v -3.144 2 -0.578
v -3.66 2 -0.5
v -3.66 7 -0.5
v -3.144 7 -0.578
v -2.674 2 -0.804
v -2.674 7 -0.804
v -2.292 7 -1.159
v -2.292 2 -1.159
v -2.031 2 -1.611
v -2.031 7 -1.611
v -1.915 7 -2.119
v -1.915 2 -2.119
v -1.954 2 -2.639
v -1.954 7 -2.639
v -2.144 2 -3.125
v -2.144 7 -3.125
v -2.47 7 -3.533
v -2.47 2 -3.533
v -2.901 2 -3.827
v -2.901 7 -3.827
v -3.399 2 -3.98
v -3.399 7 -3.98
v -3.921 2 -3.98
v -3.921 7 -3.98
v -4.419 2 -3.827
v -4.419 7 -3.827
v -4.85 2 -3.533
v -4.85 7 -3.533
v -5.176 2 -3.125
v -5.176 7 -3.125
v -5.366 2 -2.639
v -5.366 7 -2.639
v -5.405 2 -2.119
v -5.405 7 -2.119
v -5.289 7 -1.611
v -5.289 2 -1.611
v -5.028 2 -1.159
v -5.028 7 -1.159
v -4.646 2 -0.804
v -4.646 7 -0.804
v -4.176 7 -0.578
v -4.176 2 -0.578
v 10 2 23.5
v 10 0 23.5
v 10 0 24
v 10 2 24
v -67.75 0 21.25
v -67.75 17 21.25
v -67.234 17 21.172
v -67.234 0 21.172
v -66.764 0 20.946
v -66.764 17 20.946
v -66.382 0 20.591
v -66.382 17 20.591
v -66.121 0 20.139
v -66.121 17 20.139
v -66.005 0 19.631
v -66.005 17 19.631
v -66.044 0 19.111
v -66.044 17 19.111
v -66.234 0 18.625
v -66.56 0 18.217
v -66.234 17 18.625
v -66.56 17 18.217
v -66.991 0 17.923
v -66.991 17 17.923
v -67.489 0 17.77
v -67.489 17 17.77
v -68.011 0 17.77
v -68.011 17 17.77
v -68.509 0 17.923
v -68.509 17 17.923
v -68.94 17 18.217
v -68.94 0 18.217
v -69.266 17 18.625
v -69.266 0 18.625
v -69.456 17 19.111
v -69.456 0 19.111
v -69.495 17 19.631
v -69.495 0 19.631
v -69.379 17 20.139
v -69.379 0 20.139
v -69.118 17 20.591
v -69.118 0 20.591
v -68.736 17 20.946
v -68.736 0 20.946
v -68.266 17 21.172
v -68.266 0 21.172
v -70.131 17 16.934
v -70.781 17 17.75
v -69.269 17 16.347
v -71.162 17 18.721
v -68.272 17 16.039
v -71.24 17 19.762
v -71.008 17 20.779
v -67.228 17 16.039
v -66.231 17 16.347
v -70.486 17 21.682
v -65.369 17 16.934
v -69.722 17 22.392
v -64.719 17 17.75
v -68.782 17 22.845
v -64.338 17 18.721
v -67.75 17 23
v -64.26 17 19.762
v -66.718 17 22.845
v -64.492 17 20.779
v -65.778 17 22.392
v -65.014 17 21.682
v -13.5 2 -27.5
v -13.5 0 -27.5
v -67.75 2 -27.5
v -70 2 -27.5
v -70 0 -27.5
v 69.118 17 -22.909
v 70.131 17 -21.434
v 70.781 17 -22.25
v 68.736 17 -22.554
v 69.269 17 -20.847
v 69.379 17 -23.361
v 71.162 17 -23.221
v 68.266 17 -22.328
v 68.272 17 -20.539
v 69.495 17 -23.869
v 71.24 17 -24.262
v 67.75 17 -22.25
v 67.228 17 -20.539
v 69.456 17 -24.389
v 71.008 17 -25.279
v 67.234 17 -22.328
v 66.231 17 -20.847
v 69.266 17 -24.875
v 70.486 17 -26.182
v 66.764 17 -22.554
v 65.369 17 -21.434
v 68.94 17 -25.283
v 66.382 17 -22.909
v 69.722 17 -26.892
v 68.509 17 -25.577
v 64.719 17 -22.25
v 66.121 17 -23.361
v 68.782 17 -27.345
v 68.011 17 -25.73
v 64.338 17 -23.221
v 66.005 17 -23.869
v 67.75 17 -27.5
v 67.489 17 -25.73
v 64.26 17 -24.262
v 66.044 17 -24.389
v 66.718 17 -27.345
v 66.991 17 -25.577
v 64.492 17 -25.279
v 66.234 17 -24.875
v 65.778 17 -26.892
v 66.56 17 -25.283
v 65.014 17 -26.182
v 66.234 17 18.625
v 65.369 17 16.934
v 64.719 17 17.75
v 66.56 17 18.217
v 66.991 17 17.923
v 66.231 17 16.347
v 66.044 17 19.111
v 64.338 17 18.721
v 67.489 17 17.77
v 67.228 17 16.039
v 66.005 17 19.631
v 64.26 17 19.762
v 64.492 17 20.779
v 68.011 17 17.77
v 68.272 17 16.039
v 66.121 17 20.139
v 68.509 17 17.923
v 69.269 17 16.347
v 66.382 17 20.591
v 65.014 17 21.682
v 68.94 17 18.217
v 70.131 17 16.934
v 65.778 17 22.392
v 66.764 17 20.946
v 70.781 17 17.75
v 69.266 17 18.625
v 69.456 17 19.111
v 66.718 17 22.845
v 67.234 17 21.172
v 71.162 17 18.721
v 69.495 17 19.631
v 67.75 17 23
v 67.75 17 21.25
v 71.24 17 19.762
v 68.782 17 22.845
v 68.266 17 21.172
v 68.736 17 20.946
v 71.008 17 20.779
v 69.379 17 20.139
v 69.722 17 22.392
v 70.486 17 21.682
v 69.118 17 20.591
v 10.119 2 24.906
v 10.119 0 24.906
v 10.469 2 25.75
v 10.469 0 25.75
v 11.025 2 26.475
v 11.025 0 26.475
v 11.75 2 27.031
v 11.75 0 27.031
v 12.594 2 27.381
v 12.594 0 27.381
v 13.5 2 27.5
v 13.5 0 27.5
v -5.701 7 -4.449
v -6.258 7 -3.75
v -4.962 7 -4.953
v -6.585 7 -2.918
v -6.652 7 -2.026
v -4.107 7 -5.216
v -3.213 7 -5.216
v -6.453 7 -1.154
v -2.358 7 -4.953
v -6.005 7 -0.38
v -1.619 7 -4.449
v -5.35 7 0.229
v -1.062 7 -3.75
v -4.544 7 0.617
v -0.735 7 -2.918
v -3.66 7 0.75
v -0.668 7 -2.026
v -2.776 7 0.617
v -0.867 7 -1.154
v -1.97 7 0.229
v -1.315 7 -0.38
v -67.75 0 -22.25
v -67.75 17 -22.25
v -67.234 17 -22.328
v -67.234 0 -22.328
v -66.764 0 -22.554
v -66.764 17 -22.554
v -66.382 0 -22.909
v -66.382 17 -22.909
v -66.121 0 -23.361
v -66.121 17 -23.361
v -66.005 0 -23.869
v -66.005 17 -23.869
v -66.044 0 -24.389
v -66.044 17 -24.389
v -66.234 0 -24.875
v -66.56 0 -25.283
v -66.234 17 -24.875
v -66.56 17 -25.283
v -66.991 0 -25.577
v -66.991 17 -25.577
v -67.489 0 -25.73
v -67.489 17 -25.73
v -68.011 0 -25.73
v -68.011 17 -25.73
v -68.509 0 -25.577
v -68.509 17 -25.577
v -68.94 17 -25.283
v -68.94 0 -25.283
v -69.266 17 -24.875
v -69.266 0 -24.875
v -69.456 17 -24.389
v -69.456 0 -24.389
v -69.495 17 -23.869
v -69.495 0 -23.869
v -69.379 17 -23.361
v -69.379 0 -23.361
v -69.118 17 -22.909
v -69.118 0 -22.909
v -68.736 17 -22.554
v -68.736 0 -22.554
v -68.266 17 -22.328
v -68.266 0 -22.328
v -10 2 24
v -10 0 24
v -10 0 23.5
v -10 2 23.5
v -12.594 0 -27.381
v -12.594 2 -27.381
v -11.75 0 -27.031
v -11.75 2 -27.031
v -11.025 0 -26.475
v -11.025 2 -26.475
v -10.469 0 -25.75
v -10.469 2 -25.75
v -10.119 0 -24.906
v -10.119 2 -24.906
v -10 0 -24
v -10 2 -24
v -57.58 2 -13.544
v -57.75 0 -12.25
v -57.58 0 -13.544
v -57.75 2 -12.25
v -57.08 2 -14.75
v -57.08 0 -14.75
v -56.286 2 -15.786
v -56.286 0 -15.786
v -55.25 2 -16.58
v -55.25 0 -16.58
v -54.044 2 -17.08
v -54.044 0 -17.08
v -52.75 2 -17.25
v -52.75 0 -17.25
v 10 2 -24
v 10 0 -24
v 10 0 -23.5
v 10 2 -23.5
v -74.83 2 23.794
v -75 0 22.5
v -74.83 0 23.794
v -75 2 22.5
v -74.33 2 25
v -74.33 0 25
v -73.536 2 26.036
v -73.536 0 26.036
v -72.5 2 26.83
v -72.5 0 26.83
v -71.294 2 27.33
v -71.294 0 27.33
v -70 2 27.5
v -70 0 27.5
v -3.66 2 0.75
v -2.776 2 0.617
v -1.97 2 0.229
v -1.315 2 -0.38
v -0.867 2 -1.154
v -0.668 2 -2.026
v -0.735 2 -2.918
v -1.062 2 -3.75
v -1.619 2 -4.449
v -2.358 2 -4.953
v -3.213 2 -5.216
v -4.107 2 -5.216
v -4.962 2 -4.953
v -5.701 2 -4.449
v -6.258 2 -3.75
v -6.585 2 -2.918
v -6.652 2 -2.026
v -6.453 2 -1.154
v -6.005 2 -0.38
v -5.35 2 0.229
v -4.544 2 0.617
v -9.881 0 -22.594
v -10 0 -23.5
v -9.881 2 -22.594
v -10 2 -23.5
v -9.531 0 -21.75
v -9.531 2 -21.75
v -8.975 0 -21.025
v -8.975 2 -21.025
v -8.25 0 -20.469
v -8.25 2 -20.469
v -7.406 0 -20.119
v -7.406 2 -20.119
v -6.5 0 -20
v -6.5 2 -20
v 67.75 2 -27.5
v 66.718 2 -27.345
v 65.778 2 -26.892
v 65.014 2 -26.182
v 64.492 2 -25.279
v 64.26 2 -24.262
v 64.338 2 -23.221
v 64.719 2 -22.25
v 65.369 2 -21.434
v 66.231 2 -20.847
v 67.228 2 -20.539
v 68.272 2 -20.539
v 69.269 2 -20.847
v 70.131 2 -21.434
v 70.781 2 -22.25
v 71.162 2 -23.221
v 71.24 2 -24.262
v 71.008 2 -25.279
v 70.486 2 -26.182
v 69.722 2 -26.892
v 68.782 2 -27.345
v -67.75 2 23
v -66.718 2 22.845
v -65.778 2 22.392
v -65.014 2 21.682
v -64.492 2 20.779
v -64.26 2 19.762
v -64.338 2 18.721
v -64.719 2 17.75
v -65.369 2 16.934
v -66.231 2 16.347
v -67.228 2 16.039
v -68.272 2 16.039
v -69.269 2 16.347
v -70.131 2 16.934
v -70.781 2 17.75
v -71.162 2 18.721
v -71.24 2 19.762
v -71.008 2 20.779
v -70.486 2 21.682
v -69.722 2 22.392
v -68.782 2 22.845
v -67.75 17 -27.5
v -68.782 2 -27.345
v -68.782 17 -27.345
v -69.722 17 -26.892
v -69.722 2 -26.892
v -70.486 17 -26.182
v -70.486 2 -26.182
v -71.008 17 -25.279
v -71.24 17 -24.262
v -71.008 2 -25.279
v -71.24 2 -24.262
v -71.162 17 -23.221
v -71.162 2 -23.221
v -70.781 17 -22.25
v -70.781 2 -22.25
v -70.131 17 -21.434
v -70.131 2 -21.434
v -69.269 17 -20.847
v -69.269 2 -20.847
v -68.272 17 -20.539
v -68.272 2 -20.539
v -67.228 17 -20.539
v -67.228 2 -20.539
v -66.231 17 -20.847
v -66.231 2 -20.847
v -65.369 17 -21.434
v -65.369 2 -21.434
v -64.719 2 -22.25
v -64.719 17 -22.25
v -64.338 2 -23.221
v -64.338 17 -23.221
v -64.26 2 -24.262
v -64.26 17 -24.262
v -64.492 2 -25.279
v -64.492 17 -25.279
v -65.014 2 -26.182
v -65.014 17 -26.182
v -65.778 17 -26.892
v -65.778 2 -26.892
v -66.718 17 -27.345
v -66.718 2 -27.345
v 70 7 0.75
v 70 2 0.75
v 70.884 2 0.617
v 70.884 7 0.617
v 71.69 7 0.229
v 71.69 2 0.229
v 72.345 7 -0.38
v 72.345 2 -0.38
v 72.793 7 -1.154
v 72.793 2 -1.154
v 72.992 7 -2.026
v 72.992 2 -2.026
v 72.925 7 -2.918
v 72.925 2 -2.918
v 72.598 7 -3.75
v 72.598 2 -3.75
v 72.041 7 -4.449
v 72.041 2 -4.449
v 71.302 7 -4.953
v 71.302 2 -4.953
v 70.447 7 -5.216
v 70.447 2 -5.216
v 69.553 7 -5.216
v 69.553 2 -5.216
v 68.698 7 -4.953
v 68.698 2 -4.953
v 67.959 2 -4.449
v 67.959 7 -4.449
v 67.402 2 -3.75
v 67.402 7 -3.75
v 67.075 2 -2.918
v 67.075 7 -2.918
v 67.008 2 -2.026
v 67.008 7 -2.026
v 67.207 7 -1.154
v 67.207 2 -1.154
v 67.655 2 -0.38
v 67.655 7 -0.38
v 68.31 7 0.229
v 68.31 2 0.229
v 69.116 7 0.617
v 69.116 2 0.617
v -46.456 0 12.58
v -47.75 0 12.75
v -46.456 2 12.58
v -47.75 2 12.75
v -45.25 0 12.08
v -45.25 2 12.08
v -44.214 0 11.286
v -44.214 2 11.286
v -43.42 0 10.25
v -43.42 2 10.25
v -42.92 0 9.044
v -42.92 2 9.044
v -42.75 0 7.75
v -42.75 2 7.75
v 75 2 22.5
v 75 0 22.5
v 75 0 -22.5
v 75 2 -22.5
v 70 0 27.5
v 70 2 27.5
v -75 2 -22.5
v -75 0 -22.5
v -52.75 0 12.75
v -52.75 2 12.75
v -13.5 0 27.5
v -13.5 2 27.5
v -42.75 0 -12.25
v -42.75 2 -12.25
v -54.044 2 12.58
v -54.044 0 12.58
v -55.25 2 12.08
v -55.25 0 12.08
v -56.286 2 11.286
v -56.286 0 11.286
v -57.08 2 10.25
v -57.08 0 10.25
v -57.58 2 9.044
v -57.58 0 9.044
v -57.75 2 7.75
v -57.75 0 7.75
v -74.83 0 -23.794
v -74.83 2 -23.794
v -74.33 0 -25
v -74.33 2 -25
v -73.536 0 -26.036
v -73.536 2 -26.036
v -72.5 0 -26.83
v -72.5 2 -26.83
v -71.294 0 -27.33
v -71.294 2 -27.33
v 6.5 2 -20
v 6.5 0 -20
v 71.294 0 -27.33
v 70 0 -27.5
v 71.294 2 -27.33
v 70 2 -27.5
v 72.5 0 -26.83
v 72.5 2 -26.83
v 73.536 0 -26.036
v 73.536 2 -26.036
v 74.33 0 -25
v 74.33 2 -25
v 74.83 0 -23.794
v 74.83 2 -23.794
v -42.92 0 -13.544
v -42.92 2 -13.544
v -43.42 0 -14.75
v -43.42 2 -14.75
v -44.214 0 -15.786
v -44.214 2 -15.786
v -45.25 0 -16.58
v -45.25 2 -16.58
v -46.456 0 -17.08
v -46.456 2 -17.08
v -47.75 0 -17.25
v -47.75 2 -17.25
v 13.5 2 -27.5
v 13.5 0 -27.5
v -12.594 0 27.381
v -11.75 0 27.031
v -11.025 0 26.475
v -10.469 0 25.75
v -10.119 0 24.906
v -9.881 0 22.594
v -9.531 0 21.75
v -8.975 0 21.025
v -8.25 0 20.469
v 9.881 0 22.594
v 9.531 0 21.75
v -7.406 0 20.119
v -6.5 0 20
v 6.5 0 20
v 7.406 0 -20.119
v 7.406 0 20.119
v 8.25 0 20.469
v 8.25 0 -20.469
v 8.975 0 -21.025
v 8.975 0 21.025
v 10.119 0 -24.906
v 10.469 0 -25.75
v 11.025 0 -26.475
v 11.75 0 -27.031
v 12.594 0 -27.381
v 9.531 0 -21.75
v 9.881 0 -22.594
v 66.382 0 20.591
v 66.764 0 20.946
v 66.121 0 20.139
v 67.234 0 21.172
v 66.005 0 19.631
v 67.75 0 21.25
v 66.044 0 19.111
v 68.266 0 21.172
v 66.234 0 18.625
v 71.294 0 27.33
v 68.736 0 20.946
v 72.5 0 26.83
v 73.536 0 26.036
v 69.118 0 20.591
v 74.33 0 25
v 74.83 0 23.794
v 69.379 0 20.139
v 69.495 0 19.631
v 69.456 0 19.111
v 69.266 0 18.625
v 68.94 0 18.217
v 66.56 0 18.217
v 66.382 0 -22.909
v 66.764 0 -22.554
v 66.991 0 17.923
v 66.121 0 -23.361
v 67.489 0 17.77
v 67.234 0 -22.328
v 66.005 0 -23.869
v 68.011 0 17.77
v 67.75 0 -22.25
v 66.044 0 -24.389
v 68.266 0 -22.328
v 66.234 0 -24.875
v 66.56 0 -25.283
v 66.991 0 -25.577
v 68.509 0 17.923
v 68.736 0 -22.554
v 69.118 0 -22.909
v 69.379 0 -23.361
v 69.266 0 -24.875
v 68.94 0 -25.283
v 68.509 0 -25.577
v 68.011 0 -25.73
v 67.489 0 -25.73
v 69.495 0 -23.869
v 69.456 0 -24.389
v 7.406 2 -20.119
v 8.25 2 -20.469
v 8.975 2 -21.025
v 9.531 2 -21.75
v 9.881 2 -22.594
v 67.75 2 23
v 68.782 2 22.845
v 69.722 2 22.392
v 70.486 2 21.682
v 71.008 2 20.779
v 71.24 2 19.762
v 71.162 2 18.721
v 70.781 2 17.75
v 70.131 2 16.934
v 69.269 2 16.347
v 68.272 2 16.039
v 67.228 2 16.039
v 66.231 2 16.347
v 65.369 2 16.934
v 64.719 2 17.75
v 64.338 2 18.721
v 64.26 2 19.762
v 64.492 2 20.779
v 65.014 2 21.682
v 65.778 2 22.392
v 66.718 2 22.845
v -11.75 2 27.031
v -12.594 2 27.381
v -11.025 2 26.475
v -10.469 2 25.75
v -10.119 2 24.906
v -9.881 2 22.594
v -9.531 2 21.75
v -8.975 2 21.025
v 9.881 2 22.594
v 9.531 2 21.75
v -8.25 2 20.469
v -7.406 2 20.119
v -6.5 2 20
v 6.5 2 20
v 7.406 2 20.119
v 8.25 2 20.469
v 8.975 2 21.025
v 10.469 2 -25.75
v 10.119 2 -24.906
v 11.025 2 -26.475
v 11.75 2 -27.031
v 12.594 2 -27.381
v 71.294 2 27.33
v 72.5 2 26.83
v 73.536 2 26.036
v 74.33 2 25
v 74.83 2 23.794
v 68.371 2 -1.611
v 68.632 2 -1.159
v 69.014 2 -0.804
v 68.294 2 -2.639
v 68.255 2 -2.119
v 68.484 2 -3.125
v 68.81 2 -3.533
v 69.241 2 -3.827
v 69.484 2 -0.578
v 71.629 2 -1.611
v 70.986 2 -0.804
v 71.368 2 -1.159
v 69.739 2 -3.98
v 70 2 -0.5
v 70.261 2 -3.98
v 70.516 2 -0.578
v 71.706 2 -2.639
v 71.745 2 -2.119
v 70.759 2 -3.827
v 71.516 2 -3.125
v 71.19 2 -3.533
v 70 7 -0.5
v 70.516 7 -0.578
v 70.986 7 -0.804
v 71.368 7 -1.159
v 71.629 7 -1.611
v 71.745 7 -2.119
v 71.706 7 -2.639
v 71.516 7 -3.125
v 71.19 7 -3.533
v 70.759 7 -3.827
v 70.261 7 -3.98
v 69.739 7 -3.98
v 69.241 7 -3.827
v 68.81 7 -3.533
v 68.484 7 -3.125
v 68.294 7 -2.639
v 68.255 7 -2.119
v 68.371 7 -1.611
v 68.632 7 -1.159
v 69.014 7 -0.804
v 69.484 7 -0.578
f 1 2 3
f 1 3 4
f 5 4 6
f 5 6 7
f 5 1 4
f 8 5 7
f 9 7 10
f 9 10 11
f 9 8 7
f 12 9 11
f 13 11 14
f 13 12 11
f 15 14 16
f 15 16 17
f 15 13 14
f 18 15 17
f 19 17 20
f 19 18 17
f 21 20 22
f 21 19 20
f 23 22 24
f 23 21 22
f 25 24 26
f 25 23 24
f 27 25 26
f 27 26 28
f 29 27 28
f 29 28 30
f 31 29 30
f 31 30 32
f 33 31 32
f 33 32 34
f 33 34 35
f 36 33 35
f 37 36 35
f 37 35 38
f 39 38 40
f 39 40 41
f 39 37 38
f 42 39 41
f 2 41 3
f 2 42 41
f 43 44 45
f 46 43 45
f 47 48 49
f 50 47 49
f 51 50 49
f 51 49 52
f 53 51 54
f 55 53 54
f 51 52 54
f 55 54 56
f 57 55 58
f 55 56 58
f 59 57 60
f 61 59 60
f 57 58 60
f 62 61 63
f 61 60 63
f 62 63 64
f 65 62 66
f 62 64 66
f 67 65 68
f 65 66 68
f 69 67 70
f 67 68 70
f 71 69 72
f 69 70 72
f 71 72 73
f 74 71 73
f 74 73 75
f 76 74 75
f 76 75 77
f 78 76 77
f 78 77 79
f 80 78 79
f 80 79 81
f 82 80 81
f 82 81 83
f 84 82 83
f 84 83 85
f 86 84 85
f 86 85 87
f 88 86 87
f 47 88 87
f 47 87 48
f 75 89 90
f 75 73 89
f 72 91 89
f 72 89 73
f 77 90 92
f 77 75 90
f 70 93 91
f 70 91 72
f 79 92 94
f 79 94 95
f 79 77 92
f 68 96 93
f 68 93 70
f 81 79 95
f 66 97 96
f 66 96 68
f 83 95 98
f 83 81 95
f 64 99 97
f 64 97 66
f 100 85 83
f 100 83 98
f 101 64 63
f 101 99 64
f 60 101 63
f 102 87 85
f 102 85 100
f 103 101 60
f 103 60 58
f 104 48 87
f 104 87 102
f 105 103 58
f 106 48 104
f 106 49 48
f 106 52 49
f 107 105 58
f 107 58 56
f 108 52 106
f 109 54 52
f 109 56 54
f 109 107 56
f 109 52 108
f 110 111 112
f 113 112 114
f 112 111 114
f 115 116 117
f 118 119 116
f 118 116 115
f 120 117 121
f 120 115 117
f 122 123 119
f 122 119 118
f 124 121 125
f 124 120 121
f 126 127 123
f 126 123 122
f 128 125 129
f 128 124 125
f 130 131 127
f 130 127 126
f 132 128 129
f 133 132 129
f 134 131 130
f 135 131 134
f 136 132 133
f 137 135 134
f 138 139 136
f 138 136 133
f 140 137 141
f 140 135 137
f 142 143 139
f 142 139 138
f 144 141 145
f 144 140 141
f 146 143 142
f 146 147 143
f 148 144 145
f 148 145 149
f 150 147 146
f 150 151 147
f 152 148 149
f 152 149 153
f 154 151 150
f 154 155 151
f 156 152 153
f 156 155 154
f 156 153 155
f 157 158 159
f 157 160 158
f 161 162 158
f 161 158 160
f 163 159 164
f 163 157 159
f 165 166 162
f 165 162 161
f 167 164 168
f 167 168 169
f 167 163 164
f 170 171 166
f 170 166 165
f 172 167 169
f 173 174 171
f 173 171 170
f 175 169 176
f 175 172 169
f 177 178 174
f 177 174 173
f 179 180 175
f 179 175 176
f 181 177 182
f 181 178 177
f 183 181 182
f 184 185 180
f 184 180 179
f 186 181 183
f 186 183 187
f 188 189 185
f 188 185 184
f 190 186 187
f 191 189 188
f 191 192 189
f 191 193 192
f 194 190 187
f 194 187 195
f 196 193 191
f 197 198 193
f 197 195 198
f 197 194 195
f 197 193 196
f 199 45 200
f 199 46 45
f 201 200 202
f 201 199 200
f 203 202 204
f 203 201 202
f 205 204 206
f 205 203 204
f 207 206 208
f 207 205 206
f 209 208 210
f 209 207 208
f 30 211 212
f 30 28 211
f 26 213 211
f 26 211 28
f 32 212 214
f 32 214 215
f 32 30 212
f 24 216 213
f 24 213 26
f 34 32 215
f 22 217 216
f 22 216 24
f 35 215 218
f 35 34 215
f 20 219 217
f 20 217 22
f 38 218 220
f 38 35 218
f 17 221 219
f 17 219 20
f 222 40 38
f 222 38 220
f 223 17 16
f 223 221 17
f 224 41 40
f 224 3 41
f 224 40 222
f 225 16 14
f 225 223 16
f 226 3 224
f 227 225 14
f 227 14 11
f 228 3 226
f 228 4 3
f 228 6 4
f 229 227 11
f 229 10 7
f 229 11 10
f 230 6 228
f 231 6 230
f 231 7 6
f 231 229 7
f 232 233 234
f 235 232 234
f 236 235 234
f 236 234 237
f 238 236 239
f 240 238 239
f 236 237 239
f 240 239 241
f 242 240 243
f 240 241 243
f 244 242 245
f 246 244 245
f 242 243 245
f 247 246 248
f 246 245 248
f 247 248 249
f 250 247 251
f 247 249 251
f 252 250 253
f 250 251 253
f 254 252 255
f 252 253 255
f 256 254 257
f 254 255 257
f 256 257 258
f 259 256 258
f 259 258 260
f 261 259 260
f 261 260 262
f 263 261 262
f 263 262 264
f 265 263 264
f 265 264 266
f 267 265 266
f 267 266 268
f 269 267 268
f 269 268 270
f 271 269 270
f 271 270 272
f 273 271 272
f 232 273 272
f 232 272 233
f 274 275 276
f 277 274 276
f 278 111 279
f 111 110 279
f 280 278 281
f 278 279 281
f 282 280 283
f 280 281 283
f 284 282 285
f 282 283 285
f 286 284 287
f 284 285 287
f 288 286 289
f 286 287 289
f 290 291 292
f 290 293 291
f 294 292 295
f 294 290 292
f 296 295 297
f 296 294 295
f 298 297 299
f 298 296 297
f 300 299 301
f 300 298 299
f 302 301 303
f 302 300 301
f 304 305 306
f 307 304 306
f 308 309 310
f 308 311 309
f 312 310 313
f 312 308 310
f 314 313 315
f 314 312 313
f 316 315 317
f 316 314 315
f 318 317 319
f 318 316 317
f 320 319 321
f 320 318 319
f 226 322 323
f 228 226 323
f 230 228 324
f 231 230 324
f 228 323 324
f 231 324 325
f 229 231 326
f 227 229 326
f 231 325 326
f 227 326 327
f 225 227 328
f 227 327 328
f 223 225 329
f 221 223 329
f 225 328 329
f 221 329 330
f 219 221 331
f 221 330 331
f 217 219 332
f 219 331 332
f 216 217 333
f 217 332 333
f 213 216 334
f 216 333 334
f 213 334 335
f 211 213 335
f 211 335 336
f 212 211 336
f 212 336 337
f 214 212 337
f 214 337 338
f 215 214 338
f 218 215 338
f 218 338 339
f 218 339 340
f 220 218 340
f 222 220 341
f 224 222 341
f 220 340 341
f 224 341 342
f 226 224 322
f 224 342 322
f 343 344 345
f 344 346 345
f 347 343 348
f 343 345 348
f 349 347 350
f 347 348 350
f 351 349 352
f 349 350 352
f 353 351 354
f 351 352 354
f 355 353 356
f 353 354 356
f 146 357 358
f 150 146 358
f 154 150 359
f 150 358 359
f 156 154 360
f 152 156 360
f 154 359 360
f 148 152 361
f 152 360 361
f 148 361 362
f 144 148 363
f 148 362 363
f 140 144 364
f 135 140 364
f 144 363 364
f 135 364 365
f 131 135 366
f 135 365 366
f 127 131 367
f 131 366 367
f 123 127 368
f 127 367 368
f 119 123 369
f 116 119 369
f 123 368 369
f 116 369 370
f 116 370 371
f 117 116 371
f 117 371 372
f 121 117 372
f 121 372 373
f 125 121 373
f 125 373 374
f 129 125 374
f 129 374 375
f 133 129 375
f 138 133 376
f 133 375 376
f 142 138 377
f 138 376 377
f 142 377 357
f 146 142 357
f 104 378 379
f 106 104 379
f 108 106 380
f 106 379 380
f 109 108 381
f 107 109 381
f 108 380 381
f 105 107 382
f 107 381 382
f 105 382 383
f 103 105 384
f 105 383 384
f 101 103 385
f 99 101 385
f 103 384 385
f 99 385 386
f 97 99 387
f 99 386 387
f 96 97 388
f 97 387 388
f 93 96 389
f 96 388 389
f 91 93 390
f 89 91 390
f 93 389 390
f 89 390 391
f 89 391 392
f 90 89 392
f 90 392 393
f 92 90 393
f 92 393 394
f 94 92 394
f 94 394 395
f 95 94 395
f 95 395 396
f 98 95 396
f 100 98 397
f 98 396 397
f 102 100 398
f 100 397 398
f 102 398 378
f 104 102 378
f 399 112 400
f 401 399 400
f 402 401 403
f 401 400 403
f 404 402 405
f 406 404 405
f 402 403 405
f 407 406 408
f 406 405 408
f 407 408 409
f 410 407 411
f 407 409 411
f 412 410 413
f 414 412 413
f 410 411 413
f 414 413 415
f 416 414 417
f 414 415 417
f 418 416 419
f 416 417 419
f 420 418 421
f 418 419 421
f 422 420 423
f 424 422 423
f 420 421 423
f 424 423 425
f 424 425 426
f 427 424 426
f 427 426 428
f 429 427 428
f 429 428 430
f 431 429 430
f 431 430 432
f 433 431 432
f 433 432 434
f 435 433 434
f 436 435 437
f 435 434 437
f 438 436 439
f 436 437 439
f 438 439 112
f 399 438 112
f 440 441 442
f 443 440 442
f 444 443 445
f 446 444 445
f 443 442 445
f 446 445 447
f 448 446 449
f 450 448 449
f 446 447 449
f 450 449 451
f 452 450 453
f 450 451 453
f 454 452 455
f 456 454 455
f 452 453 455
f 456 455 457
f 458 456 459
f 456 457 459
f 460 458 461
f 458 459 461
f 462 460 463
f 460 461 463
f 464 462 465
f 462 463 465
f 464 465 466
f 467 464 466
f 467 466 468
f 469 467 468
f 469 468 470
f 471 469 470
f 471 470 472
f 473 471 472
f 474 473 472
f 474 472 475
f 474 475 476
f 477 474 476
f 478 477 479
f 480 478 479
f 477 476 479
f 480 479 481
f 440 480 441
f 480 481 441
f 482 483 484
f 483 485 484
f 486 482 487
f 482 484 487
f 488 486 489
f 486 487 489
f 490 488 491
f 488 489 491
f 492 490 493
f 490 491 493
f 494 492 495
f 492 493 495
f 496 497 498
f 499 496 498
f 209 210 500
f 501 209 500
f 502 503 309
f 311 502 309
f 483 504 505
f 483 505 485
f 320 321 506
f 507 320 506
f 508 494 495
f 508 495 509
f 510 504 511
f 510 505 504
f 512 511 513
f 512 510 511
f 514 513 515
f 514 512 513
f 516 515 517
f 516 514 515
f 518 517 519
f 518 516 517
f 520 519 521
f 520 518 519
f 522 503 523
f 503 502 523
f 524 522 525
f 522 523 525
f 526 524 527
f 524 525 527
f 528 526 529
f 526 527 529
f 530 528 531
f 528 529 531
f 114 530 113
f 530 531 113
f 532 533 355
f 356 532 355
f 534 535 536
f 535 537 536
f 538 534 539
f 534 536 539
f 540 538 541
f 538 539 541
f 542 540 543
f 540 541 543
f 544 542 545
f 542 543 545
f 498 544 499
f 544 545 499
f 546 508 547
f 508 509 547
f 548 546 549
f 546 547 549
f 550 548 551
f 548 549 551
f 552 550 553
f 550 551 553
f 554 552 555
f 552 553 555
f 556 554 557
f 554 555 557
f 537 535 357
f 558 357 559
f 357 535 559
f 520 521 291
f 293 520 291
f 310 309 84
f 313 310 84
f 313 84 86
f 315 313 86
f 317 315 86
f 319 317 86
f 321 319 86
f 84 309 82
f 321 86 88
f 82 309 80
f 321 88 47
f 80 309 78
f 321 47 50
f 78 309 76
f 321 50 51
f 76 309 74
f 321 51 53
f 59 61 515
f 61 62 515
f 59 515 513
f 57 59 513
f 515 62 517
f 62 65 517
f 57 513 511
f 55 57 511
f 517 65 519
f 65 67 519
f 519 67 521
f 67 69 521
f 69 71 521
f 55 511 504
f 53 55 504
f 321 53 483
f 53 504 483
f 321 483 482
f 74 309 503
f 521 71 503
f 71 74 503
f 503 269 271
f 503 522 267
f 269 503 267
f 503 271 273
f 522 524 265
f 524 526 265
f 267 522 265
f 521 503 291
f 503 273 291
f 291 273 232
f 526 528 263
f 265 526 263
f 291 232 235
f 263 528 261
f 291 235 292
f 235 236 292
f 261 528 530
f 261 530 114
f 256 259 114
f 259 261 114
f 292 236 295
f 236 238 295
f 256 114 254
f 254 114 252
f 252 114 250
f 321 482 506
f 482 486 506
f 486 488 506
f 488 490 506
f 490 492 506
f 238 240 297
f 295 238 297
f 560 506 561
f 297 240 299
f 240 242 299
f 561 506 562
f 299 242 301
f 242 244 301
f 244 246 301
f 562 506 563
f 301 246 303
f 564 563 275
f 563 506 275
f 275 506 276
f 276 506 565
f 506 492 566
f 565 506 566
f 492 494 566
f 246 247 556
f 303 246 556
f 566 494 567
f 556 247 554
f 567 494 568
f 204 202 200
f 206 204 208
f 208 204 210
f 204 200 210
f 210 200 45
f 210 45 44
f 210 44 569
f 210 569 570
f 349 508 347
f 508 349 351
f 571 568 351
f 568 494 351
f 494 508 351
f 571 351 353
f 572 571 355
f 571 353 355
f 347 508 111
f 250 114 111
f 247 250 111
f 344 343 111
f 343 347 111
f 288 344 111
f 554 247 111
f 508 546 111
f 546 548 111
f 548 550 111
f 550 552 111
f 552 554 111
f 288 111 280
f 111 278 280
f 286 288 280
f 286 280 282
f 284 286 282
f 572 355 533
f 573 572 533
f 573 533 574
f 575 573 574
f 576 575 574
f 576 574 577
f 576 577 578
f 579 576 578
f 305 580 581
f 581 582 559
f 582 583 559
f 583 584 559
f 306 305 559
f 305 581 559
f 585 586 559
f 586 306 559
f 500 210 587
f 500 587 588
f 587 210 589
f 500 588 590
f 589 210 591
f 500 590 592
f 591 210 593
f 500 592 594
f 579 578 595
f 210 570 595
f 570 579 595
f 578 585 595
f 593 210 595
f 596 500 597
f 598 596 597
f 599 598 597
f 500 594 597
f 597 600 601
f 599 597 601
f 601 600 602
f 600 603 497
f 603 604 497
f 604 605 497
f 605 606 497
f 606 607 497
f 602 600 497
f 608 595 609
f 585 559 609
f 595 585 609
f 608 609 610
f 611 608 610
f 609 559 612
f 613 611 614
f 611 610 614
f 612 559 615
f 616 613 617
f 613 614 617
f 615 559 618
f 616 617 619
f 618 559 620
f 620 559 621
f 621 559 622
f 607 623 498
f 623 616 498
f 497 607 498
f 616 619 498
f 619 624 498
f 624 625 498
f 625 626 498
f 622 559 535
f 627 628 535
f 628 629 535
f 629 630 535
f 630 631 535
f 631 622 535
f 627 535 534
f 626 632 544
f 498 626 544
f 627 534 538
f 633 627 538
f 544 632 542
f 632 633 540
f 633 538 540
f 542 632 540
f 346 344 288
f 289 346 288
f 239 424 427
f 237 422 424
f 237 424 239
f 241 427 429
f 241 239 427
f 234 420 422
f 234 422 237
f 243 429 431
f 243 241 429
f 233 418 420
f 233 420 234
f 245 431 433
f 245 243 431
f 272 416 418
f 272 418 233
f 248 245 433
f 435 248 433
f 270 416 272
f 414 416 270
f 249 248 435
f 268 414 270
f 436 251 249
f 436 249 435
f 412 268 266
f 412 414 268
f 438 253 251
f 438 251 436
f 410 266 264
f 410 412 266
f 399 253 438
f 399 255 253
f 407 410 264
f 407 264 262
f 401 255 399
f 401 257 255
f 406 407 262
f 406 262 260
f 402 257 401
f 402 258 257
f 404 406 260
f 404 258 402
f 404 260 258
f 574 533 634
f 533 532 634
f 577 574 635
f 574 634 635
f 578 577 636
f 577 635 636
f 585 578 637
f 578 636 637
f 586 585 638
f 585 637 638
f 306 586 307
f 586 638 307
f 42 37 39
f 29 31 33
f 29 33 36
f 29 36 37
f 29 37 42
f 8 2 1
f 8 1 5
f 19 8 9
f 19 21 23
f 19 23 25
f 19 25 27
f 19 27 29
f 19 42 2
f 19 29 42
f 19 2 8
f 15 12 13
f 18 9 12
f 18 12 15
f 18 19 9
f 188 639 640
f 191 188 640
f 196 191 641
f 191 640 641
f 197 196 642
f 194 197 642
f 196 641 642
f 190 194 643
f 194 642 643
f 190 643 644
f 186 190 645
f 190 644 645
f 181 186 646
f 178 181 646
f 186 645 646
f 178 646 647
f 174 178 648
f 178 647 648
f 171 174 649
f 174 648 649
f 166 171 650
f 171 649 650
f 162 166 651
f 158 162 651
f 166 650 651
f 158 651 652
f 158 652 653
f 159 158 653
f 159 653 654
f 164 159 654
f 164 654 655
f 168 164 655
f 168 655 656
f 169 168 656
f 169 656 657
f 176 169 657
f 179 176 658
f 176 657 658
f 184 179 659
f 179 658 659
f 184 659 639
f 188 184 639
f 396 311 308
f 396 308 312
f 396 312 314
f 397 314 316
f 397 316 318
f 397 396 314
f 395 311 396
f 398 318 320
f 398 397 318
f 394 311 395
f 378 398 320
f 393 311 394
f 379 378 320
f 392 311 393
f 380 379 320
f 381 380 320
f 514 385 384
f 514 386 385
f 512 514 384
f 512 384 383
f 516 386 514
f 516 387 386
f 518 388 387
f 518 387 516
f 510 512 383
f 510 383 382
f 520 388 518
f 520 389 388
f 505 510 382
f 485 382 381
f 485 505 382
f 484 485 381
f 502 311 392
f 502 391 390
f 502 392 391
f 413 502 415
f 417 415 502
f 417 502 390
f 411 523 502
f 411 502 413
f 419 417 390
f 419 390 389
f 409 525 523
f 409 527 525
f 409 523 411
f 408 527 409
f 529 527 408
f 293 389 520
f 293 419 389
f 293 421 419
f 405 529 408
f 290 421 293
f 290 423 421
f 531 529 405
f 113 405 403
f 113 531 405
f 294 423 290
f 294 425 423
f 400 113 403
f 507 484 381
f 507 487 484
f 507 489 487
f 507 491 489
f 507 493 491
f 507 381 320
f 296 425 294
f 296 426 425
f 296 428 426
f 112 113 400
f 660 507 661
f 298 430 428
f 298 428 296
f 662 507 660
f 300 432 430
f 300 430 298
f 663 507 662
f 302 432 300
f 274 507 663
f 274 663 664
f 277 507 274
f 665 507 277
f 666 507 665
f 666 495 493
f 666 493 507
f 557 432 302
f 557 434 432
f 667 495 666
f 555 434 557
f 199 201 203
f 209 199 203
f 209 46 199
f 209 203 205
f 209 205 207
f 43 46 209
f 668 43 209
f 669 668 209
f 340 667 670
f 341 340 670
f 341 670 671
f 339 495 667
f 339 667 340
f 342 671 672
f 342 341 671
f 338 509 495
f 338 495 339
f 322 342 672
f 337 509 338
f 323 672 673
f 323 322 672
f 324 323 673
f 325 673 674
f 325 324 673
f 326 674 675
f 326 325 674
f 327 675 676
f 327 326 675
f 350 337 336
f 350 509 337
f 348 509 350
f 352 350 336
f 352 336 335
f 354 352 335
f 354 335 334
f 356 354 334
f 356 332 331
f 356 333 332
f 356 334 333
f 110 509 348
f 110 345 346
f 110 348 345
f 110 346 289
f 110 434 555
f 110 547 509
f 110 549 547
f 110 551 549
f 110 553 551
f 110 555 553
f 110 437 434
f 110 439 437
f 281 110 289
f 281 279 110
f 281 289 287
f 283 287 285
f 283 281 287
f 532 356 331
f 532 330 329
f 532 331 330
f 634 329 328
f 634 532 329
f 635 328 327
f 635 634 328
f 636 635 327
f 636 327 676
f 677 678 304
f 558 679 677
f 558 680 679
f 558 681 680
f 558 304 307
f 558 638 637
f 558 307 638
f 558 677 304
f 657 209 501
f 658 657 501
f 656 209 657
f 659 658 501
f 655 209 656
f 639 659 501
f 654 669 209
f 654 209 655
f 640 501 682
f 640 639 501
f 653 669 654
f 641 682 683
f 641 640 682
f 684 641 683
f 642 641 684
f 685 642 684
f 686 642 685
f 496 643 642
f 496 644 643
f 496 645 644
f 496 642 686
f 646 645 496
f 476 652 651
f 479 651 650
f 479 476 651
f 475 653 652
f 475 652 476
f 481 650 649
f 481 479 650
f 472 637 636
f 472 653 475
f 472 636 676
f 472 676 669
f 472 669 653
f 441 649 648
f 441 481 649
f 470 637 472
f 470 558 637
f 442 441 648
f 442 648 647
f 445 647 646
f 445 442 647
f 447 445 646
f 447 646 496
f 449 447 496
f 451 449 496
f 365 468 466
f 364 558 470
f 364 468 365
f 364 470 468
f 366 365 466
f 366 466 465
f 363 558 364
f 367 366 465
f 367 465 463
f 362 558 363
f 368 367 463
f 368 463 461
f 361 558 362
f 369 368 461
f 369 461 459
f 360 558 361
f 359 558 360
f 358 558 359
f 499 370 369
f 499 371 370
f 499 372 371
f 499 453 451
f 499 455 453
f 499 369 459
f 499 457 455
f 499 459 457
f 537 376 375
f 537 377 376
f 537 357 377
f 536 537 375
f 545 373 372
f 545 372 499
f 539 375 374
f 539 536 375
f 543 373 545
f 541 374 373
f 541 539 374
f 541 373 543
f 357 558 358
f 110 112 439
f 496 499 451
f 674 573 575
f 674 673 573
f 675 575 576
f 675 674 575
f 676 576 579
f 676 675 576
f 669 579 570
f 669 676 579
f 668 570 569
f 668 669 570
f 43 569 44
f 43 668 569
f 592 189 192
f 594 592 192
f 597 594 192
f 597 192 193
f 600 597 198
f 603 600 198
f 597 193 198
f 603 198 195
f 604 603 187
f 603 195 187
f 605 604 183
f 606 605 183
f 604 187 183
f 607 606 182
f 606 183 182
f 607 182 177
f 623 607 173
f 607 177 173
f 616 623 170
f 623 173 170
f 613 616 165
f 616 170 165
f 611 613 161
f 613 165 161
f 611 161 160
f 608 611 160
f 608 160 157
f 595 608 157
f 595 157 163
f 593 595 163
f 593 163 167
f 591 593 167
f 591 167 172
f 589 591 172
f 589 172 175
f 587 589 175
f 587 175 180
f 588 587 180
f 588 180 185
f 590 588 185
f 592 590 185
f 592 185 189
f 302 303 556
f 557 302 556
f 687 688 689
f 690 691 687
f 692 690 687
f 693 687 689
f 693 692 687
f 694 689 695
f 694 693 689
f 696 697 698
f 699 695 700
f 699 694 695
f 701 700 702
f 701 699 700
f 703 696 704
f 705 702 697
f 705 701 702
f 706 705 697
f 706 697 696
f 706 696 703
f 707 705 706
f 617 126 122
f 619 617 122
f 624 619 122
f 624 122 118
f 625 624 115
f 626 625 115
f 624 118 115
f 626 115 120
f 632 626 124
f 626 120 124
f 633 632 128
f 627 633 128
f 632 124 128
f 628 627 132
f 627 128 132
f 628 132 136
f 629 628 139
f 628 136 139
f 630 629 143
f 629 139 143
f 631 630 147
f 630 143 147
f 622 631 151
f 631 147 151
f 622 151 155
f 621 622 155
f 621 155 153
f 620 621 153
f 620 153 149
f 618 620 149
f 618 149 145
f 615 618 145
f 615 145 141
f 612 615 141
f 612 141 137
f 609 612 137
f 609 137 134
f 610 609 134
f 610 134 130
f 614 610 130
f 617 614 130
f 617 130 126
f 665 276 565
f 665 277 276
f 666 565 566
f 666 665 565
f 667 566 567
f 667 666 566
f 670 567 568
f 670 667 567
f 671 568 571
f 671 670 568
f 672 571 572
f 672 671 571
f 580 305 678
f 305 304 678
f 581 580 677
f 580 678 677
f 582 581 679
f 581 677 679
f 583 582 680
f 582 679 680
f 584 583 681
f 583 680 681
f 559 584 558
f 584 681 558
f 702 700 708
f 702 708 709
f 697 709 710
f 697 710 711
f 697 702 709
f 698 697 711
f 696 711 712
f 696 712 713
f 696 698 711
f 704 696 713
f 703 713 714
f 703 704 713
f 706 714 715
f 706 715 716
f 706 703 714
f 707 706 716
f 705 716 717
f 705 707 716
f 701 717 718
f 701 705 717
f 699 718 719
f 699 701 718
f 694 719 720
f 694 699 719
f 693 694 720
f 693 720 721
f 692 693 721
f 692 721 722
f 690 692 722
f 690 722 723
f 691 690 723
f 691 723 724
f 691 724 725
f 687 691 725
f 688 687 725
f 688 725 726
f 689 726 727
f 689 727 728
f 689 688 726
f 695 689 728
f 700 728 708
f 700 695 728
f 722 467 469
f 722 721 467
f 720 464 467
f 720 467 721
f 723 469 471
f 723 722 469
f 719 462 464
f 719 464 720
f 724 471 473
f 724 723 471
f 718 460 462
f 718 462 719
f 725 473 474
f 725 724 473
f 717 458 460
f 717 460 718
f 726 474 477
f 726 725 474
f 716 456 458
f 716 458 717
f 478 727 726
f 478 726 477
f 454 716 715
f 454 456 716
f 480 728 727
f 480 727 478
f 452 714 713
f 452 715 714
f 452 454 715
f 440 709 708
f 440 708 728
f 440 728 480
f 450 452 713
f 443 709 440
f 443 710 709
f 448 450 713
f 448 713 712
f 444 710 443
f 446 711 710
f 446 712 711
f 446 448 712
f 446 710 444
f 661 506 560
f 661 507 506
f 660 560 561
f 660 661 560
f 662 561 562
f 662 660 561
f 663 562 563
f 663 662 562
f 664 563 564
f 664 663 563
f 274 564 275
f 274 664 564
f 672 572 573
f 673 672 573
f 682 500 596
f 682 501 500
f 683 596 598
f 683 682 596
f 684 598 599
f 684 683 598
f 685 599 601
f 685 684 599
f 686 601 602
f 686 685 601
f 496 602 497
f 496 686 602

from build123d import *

# Parameters (mm, degrees)
SKETCH1_W           = 15
SKETCH1_H           = 30
BOSS_EXTRUDE1_DEPTH = 2
SKETCH2_R           = 3.5
BOSS_EXTRUDE2_DEPTH = 15
CUT_EXTRUDE1_REACH  = 83.672
SKETCH3_R           = 1.75
SKETCH4_R           = 3
SKETCH4_R_2         = 1.75
BOSS_EXTRUDE3_DEPTH = 5
FILLET1_R           = 5
FILLET2_R           = 3.5


with BuildPart() as part:
    # Sketch1 → Boss-Extrude1 (new body)
    with BuildSketch(Plane(origin=(0, 0, 0), x_dir=(1, 0, 0), z_dir=(0, 1, 0))):
        Polygon((-75, 27.5), (-75, -27.5), (-10, -27.5), (-10, -20), (10, -20), (10, -27.5), (75, -27.5), (75, 27.5), (10, 27.5), (10, 20), (-10, 20), (-10, 27.5), align=None)
        with Locations((-50.25, 2.25)):
            Rectangle(SKETCH1_W, SKETCH1_H, mode=Mode.SUBTRACT)
    extrude(amount=BOSS_EXTRUDE1_DEPTH)

    # Sketch2 → Boss-Extrude2 (add)
    with BuildSketch(Plane(origin=(0, 2, 0), x_dir=(1, 0, 0), z_dir=(0, 1, 0))):
        with Locations(Location((-67.75, -19.5, 0), (0, 0, 270))):
            Circle(SKETCH2_R)
        with Locations(Location((-67.75, 24, 0), (0, 0, 90))):
            Circle(SKETCH2_R)
        with Locations(Location((67.75, 24, 0), (0, 0, 90))):
            Circle(SKETCH2_R)
        with Locations(Location((67.75, -19.5, 0), (0, 0, 270))):
            Circle(SKETCH2_R)
    extrude(amount=BOSS_EXTRUDE2_DEPTH)

    # Sketch3 → Cut-Extrude1 (cut, up to next)
    with BuildSketch(Plane(origin=(0, 17, 0), x_dir=(1, 0, 0), z_dir=(0, 1, 0)), mode=Mode.PRIVATE) as cut_extrude1_sk1:
        with Locations(Location((-67.75, -19.5, 0), (0, 0, 270))):
            Circle(SKETCH3_R)
    cut_extrude1_tool1 = extrude(cut_extrude1_sk1.sketch, amount=-CUT_EXTRUDE1_REACH, mode=Mode.PRIVATE) & part.part
    # Sketch3 → Cut-Extrude1 (cut, up to next)
    with BuildSketch(Plane(origin=(0, 17, 0), x_dir=(1, 0, 0), z_dir=(0, 1, 0)), mode=Mode.PRIVATE) as cut_extrude1_sk2:
        with Locations(Location((-67.75, 24, 0), (0, 0, 270))):
            Circle(SKETCH3_R)
    cut_extrude1_tool2 = extrude(cut_extrude1_sk2.sketch, amount=-CUT_EXTRUDE1_REACH, mode=Mode.PRIVATE) & part.part
    # Sketch3 → Cut-Extrude1 (cut, up to next)
    with BuildSketch(Plane(origin=(0, 17, 0), x_dir=(1, 0, 0), z_dir=(0, 1, 0)), mode=Mode.PRIVATE) as cut_extrude1_sk3:
        with Locations(Location((67.75, 24, 0), (0, 0, 270))):
            Circle(SKETCH3_R)
    cut_extrude1_tool3 = extrude(cut_extrude1_sk3.sketch, amount=-CUT_EXTRUDE1_REACH, mode=Mode.PRIVATE) & part.part
    # Sketch3 → Cut-Extrude1 (cut, up to next)
    with BuildSketch(Plane(origin=(0, 17, 0), x_dir=(1, 0, 0), z_dir=(0, 1, 0)), mode=Mode.PRIVATE) as cut_extrude1_sk4:
        with Locations(Location((67.75, -19.5, 0), (0, 0, 270))):
            Circle(SKETCH3_R)
    cut_extrude1_tool4 = extrude(cut_extrude1_sk4.sketch, amount=-CUT_EXTRUDE1_REACH, mode=Mode.PRIVATE) & part.part
    add(cut_extrude1_tool1.solids().sort_by_distance((-67.75, 17, 19.5))[0], mode=Mode.SUBTRACT)
    add(cut_extrude1_tool2.solids().sort_by_distance((-67.75, 17, -24))[0], mode=Mode.SUBTRACT)
    add(cut_extrude1_tool3.solids().sort_by_distance((67.75, 17, -24))[0], mode=Mode.SUBTRACT)
    add(cut_extrude1_tool4.solids().sort_by_distance((67.75, 17, 19.5))[0], mode=Mode.SUBTRACT)

    # Sketch4 → Boss-Extrude3 (add)
    # profile 1 of 2: a face of its own
    with BuildSketch(Plane(origin=(0, 2, 0), x_dir=(1, 0, 0), z_dir=(0, 1, 0))):
        with Locations(Location((-3.66, 2.25, 0), (0, 0, 270))):
            Circle(SKETCH4_R)
        with Locations(Location((-3.66, 2.25, 0), (0, 0, 270))):
            Circle(SKETCH4_R_2, mode=Mode.SUBTRACT)
    # profile 2 of 2: a face of its own
    with BuildSketch(Plane(origin=(0, 2, 0), x_dir=(1, 0, 0), z_dir=(0, 1, 0))):
        with Locations(Location((70, 2.25, 0), (0, 0, 270))):
            Circle(SKETCH4_R)
        with Locations(Location((70, 2.25, 0), (0, 0, 270))):
            Circle(SKETCH4_R_2, mode=Mode.SUBTRACT)
    extrude(amount=BOSS_EXTRUDE3_DEPTH)

    # Fillet1
    fillet1_edges = [part.edges().sort_by_distance(p)[0] for p in [
        (-57.75, 1, -17.25),
        (-57.75, 1, 12.75),
        (-42.75, 1, 12.75),
        (-42.75, 1, -17.25),
        (-75, 1, 27.5),
        (-75, 1, -27.5),
        (75, 1, -27.5),
        (75, 1, 27.5),
    ]]
    fillet(fillet1_edges, radius=FILLET1_R)

    # Fillet2
    fillet2_edges = [part.edges().sort_by_distance(p)[0] for p in [
        (10, 1, 20),
        (-10, 1, 20),
        (-10, 1, 27.5),
        (-10, 1, -27.5),
        (-10, 1, -20),
        (10, 1, -20),
        (10, 1, -27.5),
        (10, 1, 27.5),
    ]]
    fillet(fillet2_edges, radius=FILLET2_R)


solid = part.part
